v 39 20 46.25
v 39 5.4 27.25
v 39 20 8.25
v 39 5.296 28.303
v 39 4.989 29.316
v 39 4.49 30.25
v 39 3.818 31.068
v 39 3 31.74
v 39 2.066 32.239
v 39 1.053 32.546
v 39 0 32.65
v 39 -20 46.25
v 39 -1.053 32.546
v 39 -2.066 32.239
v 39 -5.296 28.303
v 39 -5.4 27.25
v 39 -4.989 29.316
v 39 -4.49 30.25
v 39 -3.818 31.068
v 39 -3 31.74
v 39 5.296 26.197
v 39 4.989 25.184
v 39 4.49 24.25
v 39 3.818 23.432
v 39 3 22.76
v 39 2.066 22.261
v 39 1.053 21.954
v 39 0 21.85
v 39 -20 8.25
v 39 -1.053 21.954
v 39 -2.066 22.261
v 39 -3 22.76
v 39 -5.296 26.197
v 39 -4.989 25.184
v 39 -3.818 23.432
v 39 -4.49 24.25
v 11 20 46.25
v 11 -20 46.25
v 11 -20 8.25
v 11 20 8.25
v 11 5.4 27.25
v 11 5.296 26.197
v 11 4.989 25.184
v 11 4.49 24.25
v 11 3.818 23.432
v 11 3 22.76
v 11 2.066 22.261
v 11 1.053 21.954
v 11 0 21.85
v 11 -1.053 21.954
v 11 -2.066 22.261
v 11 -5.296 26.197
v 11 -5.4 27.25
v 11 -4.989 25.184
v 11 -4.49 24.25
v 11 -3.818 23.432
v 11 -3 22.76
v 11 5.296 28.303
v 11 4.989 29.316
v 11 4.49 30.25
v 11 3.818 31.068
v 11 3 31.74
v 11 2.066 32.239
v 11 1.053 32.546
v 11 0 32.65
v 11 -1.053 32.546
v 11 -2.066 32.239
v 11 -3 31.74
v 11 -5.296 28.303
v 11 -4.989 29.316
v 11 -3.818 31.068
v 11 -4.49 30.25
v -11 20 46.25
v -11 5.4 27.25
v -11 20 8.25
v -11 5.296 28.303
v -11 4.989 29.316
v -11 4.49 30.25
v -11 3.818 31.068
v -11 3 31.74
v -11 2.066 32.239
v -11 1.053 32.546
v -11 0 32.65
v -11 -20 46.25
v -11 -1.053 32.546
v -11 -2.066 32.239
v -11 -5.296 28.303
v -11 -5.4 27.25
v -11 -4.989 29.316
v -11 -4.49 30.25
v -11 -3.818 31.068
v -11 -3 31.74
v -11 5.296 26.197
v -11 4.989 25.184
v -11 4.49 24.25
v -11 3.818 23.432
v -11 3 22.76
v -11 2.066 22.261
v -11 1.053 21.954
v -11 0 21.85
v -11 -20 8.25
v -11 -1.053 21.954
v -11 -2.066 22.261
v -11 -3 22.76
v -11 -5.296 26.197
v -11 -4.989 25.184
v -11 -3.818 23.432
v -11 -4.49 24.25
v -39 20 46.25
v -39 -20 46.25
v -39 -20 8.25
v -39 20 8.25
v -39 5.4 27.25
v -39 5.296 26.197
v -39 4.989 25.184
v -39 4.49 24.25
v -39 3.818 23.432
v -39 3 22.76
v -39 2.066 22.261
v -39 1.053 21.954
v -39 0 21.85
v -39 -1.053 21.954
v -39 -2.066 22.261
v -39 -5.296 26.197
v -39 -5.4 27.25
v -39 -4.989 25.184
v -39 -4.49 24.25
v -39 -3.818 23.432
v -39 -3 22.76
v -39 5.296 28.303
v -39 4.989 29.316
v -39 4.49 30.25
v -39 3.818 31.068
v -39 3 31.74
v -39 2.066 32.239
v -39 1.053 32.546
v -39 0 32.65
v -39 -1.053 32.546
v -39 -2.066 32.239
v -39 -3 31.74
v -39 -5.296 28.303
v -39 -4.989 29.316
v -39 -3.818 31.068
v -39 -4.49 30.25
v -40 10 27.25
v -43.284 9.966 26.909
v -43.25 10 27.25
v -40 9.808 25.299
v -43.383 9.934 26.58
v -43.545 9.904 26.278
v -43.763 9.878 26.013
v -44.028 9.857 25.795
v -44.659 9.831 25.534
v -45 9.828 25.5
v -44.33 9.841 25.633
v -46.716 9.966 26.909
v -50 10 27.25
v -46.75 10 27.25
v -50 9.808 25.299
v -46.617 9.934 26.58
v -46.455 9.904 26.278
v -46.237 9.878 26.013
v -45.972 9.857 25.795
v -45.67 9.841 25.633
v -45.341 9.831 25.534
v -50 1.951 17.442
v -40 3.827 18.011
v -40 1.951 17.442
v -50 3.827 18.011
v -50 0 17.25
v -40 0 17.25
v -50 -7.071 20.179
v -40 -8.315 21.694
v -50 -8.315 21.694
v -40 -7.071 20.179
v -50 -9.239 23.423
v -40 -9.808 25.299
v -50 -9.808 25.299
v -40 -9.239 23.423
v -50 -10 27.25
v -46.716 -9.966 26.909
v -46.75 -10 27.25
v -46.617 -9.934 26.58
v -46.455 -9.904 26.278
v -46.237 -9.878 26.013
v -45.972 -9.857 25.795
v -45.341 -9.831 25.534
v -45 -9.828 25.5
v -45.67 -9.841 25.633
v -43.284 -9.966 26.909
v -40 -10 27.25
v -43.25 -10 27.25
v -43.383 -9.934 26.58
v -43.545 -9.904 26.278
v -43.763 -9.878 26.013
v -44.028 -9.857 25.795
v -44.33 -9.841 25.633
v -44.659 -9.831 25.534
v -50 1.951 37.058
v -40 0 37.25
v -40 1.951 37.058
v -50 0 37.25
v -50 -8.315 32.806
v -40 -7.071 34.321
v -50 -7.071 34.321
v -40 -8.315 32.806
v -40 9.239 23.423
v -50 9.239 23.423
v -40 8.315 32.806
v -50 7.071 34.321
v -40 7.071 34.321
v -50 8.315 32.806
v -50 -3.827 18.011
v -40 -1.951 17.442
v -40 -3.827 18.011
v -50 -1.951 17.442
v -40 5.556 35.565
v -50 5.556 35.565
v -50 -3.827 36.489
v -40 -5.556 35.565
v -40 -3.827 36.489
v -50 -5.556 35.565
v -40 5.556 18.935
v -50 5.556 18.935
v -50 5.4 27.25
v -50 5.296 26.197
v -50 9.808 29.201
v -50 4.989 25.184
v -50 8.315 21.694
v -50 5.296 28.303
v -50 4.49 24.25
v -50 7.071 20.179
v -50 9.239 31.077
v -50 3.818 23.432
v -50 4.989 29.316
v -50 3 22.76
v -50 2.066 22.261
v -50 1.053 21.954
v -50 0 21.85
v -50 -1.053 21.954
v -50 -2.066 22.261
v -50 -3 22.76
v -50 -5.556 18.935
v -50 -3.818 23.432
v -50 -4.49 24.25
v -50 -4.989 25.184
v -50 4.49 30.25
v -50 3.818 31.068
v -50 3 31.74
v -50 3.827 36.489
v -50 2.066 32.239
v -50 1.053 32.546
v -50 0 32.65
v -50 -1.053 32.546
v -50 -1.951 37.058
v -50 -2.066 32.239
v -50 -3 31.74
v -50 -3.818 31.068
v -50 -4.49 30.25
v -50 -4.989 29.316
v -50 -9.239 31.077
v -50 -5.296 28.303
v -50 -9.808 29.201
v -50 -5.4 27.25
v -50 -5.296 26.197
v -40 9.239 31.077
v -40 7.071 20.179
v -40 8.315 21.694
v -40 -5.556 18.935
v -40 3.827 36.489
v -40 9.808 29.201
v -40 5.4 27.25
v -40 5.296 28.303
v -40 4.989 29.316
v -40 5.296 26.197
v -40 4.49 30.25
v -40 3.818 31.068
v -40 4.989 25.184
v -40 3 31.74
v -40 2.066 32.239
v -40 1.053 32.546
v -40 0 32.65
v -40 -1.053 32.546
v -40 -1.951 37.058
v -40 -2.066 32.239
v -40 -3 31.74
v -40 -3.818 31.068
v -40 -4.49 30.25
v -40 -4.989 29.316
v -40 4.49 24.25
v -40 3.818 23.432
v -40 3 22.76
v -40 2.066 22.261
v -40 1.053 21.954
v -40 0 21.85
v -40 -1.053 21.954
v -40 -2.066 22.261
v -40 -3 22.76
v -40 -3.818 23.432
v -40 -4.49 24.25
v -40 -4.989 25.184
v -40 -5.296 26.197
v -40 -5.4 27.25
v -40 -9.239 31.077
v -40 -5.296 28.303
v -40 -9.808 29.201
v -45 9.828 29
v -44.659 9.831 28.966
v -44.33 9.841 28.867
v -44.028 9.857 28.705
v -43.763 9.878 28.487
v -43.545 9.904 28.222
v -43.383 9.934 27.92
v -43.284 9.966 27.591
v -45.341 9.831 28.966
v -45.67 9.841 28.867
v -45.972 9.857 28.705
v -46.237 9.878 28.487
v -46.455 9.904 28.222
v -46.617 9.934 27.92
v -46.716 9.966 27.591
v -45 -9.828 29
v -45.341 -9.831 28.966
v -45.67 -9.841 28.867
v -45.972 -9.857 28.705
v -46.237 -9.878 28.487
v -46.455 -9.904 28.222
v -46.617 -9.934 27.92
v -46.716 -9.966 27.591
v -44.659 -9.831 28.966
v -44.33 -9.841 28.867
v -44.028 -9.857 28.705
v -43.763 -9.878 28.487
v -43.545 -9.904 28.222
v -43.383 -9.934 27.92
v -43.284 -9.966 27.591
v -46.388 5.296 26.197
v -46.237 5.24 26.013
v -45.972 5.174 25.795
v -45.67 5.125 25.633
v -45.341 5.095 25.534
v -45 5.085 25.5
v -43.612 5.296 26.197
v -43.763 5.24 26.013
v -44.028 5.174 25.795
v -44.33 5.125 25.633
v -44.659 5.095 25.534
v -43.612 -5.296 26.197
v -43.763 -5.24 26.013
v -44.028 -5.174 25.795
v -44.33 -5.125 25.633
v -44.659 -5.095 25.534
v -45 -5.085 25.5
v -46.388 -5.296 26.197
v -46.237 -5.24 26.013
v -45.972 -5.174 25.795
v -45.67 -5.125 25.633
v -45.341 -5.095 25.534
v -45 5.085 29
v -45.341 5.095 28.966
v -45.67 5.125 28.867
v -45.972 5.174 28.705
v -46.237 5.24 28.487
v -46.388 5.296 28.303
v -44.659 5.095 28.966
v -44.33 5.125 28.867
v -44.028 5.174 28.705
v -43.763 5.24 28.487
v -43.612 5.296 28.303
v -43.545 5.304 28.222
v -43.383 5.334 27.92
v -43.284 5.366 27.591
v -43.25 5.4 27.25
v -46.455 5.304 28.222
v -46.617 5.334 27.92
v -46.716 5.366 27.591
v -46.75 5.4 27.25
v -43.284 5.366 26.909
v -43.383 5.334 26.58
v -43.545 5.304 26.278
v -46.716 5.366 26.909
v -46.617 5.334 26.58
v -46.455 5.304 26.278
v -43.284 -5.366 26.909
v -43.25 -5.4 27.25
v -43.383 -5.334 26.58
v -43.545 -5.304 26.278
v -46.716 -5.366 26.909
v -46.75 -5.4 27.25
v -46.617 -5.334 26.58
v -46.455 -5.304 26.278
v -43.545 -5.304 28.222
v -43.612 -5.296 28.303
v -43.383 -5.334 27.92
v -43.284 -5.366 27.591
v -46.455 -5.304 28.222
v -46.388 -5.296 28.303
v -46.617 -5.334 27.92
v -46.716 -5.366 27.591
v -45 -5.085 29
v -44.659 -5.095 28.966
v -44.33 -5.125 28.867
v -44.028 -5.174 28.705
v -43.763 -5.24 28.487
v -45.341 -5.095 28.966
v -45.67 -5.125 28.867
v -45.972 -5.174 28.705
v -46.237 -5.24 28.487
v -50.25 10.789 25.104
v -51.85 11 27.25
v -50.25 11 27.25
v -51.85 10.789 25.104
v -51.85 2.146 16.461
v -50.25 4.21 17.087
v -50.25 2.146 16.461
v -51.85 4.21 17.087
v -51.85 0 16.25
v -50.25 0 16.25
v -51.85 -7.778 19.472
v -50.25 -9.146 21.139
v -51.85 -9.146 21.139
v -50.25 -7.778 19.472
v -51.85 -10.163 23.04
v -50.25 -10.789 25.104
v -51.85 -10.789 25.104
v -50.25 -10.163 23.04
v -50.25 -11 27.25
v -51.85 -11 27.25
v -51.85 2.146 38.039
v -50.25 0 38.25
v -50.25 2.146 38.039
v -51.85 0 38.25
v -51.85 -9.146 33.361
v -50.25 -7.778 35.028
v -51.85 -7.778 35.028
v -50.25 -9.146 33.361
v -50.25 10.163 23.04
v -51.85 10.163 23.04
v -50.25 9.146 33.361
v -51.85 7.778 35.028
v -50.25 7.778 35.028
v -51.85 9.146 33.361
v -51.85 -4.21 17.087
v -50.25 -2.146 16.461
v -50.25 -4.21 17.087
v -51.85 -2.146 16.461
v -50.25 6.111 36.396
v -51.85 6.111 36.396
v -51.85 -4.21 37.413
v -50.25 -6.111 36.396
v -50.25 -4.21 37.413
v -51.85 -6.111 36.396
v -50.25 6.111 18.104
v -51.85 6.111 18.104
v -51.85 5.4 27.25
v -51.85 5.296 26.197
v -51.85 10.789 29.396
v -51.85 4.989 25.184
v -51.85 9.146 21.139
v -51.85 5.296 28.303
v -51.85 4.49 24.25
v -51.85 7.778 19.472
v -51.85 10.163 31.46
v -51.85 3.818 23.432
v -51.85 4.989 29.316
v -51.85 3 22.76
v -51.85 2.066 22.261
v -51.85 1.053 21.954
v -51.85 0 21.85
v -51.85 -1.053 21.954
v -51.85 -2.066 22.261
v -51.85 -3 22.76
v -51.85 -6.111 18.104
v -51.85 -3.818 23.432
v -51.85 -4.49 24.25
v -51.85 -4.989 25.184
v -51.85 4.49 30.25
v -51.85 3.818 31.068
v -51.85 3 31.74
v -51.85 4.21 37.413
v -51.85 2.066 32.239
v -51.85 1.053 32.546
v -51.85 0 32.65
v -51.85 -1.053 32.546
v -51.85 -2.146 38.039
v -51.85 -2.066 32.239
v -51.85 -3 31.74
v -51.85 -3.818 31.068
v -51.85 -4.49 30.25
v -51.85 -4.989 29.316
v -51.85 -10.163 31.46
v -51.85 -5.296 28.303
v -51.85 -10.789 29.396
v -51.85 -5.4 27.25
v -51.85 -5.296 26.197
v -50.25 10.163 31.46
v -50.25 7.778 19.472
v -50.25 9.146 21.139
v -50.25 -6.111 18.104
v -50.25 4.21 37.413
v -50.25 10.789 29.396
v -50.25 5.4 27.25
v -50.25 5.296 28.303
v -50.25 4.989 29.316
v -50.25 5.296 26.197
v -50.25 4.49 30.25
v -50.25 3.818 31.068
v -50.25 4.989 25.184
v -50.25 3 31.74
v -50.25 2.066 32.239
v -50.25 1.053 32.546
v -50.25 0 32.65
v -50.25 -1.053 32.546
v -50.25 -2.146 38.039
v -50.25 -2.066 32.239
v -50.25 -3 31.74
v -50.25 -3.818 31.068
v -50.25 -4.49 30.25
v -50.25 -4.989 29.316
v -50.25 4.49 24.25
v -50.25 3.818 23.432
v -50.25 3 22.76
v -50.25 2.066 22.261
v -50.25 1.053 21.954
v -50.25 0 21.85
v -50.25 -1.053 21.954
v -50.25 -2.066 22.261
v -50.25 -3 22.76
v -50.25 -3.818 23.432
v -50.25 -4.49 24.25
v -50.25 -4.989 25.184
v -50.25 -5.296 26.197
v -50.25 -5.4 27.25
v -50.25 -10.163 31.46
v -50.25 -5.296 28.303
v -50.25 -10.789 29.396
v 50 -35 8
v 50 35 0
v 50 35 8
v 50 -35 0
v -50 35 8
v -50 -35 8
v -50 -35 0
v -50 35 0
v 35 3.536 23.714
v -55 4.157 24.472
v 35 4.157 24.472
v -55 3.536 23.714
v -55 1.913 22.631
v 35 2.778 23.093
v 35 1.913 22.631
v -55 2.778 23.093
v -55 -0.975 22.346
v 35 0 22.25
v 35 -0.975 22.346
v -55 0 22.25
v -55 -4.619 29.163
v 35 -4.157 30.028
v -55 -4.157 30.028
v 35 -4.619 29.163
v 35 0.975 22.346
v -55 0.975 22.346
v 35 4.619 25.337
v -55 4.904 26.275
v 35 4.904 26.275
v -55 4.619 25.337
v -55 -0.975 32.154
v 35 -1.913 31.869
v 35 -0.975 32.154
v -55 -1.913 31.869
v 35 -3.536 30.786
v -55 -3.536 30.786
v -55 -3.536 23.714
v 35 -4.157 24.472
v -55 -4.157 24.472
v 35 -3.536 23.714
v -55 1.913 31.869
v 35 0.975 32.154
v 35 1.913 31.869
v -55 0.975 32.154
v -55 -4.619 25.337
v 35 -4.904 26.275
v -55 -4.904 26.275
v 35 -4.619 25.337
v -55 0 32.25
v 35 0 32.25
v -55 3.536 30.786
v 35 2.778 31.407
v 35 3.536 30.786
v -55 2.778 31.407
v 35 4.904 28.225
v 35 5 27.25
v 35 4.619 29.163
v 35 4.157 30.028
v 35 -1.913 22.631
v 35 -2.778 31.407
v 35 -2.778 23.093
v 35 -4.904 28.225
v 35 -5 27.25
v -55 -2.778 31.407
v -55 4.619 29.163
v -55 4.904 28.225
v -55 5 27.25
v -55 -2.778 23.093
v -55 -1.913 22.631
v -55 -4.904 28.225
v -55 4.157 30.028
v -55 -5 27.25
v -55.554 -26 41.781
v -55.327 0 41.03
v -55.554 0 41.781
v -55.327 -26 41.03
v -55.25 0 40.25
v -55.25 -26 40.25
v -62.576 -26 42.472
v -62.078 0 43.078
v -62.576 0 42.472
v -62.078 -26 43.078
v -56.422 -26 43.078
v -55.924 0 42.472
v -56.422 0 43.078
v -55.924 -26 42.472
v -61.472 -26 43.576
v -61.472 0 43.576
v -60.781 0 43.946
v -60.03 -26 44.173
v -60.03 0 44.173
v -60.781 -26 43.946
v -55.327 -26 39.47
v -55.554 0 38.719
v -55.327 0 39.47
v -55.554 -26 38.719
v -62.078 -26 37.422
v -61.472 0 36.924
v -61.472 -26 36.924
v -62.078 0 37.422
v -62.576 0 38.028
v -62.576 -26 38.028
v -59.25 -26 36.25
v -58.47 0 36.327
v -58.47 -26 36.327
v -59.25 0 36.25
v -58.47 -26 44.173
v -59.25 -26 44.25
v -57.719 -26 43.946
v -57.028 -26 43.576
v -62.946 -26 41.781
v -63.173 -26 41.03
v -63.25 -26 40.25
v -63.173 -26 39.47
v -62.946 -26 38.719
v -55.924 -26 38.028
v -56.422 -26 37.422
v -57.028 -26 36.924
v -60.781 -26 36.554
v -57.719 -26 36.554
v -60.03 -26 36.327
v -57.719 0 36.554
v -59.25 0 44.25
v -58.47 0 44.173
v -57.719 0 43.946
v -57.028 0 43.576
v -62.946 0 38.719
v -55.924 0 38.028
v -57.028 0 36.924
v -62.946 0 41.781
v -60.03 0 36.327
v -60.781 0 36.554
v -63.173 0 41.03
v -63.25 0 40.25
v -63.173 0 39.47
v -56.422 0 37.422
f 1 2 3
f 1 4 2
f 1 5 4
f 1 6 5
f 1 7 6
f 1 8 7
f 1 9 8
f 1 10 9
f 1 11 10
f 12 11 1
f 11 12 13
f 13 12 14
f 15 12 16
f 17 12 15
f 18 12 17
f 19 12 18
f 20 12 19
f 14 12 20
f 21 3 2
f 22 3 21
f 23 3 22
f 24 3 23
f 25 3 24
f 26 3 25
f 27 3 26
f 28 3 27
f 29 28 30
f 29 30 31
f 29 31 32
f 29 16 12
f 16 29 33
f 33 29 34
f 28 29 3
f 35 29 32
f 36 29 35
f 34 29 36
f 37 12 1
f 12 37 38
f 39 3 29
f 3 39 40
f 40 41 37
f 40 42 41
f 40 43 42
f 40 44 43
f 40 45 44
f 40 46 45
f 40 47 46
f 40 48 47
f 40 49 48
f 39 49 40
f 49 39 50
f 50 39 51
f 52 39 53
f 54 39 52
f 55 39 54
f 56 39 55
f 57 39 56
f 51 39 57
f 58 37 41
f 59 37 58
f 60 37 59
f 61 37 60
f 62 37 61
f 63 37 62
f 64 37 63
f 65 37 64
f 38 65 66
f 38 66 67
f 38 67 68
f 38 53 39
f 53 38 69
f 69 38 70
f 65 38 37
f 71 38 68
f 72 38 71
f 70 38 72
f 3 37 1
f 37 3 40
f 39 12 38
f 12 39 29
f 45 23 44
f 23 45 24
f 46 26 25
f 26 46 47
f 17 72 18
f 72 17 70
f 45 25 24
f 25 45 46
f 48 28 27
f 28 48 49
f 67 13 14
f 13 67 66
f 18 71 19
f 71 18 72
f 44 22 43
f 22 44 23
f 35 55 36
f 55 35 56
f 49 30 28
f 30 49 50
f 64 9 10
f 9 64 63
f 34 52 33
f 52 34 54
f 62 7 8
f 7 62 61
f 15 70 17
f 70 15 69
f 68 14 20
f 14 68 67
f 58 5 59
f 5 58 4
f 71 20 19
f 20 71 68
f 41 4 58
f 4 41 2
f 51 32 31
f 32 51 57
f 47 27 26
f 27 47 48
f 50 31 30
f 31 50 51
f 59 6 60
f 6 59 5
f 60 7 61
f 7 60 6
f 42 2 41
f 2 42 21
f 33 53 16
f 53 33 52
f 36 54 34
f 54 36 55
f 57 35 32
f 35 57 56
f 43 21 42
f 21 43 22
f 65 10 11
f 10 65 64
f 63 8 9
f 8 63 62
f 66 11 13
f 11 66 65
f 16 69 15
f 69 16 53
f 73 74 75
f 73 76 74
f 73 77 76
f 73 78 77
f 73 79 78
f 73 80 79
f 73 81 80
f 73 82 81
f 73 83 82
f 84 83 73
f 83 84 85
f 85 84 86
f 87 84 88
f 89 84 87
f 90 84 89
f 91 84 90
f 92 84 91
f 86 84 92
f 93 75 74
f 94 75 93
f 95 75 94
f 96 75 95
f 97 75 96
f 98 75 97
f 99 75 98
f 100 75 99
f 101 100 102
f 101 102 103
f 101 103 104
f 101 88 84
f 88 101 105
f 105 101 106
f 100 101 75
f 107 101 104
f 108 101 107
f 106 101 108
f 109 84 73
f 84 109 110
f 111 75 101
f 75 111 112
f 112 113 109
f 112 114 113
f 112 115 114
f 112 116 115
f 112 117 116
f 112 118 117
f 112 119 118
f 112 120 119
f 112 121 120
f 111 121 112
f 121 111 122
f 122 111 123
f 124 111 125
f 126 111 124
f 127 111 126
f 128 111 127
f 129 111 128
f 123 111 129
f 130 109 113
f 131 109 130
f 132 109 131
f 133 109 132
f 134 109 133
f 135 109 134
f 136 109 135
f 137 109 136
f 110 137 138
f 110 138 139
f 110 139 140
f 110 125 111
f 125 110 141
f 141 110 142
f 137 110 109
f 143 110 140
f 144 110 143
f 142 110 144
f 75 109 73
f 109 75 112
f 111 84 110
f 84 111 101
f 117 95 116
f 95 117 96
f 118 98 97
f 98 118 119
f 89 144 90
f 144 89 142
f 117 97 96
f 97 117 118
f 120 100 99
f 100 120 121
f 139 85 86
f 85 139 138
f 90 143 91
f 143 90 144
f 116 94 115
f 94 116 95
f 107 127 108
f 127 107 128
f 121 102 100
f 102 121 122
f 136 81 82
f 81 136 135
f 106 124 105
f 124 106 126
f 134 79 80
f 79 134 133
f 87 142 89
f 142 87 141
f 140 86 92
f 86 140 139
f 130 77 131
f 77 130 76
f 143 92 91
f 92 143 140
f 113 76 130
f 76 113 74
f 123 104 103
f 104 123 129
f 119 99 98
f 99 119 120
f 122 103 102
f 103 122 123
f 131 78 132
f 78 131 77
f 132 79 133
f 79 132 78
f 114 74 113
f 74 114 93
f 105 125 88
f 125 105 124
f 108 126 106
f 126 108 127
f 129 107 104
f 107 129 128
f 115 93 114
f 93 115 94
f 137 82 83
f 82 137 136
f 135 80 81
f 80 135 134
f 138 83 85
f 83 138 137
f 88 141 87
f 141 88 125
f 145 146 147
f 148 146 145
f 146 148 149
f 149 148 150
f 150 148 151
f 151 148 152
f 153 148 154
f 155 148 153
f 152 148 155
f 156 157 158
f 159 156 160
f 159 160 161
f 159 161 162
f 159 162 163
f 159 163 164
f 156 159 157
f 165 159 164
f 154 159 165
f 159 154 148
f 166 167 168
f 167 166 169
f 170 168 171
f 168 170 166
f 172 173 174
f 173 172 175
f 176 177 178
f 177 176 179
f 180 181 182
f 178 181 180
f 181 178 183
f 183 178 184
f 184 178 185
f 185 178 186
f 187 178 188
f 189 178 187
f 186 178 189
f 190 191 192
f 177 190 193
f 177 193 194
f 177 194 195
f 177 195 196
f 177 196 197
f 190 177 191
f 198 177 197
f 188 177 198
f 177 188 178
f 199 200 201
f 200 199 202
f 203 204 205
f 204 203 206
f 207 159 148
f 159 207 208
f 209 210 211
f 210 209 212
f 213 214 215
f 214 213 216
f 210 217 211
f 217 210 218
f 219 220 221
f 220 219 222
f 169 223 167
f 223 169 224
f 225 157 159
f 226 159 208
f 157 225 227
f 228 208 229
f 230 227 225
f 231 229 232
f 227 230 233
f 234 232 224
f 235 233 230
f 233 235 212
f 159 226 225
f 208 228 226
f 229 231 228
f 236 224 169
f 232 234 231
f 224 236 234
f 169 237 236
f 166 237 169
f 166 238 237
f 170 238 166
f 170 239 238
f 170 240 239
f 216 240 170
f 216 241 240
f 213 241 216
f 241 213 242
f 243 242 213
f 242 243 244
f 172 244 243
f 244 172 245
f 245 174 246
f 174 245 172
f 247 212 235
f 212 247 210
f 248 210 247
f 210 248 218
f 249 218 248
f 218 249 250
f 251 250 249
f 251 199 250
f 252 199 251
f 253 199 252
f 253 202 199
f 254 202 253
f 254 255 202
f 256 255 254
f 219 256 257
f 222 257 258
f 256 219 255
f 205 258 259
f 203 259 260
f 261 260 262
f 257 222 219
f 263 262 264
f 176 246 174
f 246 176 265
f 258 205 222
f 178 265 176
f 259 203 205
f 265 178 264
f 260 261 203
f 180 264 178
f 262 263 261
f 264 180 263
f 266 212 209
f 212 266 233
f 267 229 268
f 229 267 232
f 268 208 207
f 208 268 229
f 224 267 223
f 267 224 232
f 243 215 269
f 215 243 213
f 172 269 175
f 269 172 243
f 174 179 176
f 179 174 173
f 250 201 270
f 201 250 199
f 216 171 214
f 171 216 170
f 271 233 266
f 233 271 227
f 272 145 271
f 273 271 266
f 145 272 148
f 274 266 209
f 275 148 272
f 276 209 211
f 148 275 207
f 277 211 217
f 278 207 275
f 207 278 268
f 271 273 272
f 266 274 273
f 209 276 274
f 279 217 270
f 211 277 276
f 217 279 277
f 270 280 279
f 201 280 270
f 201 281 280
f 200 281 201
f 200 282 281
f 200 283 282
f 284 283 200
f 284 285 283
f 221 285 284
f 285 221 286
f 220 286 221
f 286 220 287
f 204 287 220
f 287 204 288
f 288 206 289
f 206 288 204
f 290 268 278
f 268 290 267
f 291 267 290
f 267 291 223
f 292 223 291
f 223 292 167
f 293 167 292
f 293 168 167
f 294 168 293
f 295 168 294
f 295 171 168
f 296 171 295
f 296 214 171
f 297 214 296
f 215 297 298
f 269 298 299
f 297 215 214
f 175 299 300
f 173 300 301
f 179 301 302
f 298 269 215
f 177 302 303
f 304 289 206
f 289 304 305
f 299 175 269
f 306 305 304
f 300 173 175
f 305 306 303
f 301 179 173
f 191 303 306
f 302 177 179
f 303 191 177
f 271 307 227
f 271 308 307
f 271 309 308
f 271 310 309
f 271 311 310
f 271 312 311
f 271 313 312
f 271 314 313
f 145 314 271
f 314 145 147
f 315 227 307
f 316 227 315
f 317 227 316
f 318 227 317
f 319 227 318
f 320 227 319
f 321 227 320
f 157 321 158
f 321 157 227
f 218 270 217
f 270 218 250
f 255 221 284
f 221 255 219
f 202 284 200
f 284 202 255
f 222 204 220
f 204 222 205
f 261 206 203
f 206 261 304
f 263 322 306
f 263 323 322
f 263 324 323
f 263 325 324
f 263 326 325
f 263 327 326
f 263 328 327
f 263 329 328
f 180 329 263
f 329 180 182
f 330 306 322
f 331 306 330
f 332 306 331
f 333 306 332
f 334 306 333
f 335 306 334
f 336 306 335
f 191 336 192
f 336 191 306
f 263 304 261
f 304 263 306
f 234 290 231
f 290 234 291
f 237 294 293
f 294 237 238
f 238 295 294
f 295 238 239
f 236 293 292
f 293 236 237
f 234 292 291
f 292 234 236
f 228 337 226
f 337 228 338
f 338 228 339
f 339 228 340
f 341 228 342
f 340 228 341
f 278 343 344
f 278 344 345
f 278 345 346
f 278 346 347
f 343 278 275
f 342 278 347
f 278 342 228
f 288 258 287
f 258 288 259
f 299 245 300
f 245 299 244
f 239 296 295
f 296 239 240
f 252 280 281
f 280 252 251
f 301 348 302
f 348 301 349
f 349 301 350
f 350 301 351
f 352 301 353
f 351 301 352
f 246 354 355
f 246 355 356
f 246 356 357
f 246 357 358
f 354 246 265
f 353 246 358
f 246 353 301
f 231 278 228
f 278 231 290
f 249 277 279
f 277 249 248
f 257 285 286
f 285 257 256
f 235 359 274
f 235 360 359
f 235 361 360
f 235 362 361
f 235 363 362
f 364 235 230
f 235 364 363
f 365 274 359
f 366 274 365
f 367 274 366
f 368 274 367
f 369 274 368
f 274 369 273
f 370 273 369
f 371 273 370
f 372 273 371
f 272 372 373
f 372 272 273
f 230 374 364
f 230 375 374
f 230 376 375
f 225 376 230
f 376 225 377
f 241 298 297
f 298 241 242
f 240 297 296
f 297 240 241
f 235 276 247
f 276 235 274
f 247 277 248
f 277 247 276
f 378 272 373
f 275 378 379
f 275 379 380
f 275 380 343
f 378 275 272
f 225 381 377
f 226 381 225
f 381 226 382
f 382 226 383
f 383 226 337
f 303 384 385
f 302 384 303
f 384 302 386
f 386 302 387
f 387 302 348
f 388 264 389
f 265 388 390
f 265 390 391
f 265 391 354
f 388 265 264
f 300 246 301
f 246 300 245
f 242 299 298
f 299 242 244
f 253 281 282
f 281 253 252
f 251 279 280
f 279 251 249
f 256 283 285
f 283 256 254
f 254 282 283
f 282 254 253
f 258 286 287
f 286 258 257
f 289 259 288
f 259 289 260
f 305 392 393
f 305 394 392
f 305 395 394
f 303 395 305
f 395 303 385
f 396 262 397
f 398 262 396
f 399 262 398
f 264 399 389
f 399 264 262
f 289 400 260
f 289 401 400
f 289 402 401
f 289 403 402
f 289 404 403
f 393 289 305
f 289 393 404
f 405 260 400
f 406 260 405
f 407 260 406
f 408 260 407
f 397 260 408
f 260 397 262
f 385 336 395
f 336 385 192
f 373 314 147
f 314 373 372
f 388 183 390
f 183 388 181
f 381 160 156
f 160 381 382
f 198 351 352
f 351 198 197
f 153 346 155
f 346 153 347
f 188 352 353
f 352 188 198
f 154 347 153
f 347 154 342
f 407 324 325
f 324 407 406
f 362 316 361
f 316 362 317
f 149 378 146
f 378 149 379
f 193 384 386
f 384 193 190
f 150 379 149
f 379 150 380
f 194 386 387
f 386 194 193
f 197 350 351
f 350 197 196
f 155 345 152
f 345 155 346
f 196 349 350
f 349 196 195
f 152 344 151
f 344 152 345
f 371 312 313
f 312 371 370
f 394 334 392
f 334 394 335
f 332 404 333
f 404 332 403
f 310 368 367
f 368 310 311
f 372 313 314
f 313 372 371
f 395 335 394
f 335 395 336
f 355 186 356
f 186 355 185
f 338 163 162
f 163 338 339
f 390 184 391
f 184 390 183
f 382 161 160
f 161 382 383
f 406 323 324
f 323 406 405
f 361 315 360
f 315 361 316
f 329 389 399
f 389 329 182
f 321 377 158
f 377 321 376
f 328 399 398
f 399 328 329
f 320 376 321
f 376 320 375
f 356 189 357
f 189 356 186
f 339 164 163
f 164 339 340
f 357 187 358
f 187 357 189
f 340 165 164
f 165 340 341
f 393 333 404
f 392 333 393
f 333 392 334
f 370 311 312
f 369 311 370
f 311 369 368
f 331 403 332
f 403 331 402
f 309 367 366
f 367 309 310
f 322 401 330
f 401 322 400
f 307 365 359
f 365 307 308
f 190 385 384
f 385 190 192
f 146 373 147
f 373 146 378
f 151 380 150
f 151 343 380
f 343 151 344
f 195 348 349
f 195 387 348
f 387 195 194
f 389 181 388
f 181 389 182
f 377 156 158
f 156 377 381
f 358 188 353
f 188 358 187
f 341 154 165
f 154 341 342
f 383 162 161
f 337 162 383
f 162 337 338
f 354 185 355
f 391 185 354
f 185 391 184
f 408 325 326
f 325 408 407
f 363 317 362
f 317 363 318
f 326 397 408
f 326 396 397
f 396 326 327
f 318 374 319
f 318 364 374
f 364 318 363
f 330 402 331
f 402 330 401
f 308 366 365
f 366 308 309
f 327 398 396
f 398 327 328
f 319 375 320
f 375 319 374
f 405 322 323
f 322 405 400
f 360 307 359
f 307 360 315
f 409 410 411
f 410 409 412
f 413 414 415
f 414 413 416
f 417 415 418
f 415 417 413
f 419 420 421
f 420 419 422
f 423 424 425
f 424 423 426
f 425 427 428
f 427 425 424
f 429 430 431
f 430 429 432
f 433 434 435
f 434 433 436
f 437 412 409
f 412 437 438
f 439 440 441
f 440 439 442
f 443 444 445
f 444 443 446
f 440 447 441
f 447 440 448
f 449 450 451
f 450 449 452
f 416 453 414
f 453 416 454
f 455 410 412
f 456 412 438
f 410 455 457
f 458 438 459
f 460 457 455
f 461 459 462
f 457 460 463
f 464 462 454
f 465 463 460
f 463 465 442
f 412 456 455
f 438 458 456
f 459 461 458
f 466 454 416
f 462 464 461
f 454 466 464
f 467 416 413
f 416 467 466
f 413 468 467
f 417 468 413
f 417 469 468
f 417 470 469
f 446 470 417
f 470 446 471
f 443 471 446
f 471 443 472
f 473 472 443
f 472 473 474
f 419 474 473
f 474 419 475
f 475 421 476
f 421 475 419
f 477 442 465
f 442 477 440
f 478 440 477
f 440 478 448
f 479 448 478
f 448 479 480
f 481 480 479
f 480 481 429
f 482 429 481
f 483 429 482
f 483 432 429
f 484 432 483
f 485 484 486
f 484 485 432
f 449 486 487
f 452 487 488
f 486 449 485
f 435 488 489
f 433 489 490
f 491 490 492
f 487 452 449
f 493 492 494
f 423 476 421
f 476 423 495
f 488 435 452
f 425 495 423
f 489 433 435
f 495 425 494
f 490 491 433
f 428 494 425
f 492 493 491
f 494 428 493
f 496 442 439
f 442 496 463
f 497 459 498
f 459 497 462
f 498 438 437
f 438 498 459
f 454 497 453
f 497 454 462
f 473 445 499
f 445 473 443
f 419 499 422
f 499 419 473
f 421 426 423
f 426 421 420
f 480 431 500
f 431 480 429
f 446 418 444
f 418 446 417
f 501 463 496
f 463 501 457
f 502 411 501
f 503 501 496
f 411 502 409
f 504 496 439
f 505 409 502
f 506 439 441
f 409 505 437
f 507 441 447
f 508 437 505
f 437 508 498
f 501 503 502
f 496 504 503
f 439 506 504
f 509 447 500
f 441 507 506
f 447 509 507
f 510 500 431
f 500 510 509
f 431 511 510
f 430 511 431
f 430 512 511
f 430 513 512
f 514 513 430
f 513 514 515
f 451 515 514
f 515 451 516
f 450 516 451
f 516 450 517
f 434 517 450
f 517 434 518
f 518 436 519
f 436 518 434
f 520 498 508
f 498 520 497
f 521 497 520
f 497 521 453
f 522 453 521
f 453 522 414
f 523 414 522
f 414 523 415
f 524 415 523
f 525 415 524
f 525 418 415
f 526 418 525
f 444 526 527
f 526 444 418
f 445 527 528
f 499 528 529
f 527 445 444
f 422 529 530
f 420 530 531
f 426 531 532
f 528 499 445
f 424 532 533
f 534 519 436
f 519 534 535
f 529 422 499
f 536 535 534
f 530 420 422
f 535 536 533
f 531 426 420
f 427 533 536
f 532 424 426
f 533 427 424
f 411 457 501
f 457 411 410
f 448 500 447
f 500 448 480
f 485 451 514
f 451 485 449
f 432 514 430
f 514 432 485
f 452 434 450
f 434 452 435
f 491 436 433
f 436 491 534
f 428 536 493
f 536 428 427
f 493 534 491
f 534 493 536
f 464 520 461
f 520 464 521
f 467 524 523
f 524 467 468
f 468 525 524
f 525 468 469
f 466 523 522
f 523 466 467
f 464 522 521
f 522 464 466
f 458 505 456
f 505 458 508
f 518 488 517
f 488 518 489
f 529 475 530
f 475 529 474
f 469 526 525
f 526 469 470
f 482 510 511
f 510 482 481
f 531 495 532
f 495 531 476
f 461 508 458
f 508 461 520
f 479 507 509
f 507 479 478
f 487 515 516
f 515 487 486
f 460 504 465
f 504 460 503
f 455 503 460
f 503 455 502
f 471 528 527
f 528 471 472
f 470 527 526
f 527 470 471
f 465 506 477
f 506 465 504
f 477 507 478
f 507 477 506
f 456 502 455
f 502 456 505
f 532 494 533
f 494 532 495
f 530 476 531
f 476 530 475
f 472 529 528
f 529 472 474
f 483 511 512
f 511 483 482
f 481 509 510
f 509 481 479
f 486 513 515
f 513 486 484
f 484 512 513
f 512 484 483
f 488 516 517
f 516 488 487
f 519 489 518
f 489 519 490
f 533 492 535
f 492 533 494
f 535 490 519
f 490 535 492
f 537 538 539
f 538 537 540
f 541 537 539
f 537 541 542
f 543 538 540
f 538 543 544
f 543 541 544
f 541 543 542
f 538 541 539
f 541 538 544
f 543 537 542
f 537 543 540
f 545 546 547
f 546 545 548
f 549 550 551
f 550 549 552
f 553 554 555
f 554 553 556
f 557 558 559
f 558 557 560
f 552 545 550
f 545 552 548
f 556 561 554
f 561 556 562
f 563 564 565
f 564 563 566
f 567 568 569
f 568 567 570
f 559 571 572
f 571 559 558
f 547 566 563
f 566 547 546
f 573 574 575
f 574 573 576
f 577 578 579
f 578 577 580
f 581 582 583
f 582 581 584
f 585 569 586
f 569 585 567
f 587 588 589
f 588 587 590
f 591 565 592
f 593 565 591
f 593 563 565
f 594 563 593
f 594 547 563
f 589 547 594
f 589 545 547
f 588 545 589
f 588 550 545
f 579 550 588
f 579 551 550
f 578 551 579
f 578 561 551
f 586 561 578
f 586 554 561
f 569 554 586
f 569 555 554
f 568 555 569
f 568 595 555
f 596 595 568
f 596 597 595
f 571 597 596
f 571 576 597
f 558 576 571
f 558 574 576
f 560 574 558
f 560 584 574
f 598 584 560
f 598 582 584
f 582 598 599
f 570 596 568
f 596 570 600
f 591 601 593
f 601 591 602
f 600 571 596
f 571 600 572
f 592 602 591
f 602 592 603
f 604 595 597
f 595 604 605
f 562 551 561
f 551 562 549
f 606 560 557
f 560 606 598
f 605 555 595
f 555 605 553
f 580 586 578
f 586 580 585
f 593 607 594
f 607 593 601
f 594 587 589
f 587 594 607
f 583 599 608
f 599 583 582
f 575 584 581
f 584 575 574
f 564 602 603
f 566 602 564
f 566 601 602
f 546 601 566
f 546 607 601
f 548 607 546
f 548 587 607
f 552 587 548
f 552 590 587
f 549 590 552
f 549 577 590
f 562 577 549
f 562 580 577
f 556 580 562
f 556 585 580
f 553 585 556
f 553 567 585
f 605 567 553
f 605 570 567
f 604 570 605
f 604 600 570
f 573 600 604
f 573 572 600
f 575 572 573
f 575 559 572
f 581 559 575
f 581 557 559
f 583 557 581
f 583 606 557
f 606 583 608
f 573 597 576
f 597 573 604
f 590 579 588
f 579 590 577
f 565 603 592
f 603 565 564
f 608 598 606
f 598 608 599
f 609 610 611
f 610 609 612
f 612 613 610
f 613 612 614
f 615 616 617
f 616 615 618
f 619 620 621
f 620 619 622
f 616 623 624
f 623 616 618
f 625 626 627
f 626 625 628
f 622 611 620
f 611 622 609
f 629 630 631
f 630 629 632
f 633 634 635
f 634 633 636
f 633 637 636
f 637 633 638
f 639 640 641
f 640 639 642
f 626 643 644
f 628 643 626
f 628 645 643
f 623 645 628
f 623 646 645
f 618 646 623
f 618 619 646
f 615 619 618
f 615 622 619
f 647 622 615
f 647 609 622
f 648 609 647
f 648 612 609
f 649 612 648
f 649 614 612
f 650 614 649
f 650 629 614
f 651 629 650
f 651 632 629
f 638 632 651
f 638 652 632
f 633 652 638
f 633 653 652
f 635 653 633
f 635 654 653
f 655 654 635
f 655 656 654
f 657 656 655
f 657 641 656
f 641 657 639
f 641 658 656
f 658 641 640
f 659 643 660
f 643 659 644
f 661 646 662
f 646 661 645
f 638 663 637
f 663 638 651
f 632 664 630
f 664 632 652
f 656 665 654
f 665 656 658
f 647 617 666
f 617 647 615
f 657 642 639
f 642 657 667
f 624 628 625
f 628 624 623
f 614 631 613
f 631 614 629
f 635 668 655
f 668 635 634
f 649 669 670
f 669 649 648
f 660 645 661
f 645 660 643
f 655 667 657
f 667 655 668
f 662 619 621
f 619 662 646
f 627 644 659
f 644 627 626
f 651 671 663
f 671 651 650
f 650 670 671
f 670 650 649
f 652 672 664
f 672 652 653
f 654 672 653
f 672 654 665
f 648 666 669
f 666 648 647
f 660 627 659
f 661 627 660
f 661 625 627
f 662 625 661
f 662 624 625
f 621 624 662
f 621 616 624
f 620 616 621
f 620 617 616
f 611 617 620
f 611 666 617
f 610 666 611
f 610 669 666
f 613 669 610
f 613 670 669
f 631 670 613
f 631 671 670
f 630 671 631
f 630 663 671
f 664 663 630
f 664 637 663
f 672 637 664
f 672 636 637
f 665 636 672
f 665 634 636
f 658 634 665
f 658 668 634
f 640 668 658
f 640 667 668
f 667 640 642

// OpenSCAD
$fn = 32;

// ------------------------------------------------------------------------
// Machine vise: screw d10, jaws 28 x 38 mm
// Every part is its own module, assembly() places every instance.
// ------------------------------------------------------------------------

// --- part 1 ---
module vise_bed() {
  difference() {
    translate([-50, -35, 0]) cube([100, 70, 8]);
  }
}

// --- part 2 ---
module vise_jaw() {
  difference() {
    translate([-14, -20, 0]) cube([28, 40, 38]);
    translate([0, 0, 19]) rotate([0, 90, 0]) cylinder(h = 30, d = 10.8, center = true);
  }
}

// --- part 3 ---
module vise_screw() {
  translate([0, 0, -45]) cylinder(h = 90, d = 10);
}

// --- part 4 ---
module screw_collar() {
  difference() {
    cylinder(h = 10, d = 20);
    translate([0, 0, -1]) cylinder(h = 12, d = 10.8);
    translate([0, 0, 5]) rotate([90, 0, 0]) cylinder(h = 22, d = 3.5, center = true);
  }
}

// --- part 5 ---
module screw_washer() {
  difference() {
      translate([0, 0, 0]) cylinder(h = 1.6, d = 22);
      translate([0, 0, -1]) cylinder(h = 3.6, d = 10.8);
    }
}

// --- part 6 ---
module vise_handle() {
  cylinder(h = 26, d = 8);
}

// --- assembly ---
module assembly() {
  color([0.80, 0.24, 0.20]) translate([0, 0, 0]) rotate([0, 0, 0]) vise_bed();
  color([0.20, 0.45, 0.75]) translate([25, 0, 8.25]) rotate([0, 0, 0]) vise_jaw();
  color([0.25, 0.62, 0.32]) translate([-25, 0, 8.25]) rotate([0, 0, 0]) vise_jaw();
  color([0.92, 0.70, 0.18]) translate([-10, 0, 27.25]) rotate([0, 90, 0]) vise_screw();
  color([0.58, 0.35, 0.70]) translate([-50, 0, 27.25]) rotate([0, 90, 0]) screw_collar();
  color([0.16, 0.66, 0.66]) translate([-51.85, 0, 27.25]) rotate([0, 90, 0]) screw_washer();
  color([0.85, 0.48, 0.18]) translate([-59.25, 0, 40.25]) rotate([90, 0, 0]) vise_handle();
}

assembly();
